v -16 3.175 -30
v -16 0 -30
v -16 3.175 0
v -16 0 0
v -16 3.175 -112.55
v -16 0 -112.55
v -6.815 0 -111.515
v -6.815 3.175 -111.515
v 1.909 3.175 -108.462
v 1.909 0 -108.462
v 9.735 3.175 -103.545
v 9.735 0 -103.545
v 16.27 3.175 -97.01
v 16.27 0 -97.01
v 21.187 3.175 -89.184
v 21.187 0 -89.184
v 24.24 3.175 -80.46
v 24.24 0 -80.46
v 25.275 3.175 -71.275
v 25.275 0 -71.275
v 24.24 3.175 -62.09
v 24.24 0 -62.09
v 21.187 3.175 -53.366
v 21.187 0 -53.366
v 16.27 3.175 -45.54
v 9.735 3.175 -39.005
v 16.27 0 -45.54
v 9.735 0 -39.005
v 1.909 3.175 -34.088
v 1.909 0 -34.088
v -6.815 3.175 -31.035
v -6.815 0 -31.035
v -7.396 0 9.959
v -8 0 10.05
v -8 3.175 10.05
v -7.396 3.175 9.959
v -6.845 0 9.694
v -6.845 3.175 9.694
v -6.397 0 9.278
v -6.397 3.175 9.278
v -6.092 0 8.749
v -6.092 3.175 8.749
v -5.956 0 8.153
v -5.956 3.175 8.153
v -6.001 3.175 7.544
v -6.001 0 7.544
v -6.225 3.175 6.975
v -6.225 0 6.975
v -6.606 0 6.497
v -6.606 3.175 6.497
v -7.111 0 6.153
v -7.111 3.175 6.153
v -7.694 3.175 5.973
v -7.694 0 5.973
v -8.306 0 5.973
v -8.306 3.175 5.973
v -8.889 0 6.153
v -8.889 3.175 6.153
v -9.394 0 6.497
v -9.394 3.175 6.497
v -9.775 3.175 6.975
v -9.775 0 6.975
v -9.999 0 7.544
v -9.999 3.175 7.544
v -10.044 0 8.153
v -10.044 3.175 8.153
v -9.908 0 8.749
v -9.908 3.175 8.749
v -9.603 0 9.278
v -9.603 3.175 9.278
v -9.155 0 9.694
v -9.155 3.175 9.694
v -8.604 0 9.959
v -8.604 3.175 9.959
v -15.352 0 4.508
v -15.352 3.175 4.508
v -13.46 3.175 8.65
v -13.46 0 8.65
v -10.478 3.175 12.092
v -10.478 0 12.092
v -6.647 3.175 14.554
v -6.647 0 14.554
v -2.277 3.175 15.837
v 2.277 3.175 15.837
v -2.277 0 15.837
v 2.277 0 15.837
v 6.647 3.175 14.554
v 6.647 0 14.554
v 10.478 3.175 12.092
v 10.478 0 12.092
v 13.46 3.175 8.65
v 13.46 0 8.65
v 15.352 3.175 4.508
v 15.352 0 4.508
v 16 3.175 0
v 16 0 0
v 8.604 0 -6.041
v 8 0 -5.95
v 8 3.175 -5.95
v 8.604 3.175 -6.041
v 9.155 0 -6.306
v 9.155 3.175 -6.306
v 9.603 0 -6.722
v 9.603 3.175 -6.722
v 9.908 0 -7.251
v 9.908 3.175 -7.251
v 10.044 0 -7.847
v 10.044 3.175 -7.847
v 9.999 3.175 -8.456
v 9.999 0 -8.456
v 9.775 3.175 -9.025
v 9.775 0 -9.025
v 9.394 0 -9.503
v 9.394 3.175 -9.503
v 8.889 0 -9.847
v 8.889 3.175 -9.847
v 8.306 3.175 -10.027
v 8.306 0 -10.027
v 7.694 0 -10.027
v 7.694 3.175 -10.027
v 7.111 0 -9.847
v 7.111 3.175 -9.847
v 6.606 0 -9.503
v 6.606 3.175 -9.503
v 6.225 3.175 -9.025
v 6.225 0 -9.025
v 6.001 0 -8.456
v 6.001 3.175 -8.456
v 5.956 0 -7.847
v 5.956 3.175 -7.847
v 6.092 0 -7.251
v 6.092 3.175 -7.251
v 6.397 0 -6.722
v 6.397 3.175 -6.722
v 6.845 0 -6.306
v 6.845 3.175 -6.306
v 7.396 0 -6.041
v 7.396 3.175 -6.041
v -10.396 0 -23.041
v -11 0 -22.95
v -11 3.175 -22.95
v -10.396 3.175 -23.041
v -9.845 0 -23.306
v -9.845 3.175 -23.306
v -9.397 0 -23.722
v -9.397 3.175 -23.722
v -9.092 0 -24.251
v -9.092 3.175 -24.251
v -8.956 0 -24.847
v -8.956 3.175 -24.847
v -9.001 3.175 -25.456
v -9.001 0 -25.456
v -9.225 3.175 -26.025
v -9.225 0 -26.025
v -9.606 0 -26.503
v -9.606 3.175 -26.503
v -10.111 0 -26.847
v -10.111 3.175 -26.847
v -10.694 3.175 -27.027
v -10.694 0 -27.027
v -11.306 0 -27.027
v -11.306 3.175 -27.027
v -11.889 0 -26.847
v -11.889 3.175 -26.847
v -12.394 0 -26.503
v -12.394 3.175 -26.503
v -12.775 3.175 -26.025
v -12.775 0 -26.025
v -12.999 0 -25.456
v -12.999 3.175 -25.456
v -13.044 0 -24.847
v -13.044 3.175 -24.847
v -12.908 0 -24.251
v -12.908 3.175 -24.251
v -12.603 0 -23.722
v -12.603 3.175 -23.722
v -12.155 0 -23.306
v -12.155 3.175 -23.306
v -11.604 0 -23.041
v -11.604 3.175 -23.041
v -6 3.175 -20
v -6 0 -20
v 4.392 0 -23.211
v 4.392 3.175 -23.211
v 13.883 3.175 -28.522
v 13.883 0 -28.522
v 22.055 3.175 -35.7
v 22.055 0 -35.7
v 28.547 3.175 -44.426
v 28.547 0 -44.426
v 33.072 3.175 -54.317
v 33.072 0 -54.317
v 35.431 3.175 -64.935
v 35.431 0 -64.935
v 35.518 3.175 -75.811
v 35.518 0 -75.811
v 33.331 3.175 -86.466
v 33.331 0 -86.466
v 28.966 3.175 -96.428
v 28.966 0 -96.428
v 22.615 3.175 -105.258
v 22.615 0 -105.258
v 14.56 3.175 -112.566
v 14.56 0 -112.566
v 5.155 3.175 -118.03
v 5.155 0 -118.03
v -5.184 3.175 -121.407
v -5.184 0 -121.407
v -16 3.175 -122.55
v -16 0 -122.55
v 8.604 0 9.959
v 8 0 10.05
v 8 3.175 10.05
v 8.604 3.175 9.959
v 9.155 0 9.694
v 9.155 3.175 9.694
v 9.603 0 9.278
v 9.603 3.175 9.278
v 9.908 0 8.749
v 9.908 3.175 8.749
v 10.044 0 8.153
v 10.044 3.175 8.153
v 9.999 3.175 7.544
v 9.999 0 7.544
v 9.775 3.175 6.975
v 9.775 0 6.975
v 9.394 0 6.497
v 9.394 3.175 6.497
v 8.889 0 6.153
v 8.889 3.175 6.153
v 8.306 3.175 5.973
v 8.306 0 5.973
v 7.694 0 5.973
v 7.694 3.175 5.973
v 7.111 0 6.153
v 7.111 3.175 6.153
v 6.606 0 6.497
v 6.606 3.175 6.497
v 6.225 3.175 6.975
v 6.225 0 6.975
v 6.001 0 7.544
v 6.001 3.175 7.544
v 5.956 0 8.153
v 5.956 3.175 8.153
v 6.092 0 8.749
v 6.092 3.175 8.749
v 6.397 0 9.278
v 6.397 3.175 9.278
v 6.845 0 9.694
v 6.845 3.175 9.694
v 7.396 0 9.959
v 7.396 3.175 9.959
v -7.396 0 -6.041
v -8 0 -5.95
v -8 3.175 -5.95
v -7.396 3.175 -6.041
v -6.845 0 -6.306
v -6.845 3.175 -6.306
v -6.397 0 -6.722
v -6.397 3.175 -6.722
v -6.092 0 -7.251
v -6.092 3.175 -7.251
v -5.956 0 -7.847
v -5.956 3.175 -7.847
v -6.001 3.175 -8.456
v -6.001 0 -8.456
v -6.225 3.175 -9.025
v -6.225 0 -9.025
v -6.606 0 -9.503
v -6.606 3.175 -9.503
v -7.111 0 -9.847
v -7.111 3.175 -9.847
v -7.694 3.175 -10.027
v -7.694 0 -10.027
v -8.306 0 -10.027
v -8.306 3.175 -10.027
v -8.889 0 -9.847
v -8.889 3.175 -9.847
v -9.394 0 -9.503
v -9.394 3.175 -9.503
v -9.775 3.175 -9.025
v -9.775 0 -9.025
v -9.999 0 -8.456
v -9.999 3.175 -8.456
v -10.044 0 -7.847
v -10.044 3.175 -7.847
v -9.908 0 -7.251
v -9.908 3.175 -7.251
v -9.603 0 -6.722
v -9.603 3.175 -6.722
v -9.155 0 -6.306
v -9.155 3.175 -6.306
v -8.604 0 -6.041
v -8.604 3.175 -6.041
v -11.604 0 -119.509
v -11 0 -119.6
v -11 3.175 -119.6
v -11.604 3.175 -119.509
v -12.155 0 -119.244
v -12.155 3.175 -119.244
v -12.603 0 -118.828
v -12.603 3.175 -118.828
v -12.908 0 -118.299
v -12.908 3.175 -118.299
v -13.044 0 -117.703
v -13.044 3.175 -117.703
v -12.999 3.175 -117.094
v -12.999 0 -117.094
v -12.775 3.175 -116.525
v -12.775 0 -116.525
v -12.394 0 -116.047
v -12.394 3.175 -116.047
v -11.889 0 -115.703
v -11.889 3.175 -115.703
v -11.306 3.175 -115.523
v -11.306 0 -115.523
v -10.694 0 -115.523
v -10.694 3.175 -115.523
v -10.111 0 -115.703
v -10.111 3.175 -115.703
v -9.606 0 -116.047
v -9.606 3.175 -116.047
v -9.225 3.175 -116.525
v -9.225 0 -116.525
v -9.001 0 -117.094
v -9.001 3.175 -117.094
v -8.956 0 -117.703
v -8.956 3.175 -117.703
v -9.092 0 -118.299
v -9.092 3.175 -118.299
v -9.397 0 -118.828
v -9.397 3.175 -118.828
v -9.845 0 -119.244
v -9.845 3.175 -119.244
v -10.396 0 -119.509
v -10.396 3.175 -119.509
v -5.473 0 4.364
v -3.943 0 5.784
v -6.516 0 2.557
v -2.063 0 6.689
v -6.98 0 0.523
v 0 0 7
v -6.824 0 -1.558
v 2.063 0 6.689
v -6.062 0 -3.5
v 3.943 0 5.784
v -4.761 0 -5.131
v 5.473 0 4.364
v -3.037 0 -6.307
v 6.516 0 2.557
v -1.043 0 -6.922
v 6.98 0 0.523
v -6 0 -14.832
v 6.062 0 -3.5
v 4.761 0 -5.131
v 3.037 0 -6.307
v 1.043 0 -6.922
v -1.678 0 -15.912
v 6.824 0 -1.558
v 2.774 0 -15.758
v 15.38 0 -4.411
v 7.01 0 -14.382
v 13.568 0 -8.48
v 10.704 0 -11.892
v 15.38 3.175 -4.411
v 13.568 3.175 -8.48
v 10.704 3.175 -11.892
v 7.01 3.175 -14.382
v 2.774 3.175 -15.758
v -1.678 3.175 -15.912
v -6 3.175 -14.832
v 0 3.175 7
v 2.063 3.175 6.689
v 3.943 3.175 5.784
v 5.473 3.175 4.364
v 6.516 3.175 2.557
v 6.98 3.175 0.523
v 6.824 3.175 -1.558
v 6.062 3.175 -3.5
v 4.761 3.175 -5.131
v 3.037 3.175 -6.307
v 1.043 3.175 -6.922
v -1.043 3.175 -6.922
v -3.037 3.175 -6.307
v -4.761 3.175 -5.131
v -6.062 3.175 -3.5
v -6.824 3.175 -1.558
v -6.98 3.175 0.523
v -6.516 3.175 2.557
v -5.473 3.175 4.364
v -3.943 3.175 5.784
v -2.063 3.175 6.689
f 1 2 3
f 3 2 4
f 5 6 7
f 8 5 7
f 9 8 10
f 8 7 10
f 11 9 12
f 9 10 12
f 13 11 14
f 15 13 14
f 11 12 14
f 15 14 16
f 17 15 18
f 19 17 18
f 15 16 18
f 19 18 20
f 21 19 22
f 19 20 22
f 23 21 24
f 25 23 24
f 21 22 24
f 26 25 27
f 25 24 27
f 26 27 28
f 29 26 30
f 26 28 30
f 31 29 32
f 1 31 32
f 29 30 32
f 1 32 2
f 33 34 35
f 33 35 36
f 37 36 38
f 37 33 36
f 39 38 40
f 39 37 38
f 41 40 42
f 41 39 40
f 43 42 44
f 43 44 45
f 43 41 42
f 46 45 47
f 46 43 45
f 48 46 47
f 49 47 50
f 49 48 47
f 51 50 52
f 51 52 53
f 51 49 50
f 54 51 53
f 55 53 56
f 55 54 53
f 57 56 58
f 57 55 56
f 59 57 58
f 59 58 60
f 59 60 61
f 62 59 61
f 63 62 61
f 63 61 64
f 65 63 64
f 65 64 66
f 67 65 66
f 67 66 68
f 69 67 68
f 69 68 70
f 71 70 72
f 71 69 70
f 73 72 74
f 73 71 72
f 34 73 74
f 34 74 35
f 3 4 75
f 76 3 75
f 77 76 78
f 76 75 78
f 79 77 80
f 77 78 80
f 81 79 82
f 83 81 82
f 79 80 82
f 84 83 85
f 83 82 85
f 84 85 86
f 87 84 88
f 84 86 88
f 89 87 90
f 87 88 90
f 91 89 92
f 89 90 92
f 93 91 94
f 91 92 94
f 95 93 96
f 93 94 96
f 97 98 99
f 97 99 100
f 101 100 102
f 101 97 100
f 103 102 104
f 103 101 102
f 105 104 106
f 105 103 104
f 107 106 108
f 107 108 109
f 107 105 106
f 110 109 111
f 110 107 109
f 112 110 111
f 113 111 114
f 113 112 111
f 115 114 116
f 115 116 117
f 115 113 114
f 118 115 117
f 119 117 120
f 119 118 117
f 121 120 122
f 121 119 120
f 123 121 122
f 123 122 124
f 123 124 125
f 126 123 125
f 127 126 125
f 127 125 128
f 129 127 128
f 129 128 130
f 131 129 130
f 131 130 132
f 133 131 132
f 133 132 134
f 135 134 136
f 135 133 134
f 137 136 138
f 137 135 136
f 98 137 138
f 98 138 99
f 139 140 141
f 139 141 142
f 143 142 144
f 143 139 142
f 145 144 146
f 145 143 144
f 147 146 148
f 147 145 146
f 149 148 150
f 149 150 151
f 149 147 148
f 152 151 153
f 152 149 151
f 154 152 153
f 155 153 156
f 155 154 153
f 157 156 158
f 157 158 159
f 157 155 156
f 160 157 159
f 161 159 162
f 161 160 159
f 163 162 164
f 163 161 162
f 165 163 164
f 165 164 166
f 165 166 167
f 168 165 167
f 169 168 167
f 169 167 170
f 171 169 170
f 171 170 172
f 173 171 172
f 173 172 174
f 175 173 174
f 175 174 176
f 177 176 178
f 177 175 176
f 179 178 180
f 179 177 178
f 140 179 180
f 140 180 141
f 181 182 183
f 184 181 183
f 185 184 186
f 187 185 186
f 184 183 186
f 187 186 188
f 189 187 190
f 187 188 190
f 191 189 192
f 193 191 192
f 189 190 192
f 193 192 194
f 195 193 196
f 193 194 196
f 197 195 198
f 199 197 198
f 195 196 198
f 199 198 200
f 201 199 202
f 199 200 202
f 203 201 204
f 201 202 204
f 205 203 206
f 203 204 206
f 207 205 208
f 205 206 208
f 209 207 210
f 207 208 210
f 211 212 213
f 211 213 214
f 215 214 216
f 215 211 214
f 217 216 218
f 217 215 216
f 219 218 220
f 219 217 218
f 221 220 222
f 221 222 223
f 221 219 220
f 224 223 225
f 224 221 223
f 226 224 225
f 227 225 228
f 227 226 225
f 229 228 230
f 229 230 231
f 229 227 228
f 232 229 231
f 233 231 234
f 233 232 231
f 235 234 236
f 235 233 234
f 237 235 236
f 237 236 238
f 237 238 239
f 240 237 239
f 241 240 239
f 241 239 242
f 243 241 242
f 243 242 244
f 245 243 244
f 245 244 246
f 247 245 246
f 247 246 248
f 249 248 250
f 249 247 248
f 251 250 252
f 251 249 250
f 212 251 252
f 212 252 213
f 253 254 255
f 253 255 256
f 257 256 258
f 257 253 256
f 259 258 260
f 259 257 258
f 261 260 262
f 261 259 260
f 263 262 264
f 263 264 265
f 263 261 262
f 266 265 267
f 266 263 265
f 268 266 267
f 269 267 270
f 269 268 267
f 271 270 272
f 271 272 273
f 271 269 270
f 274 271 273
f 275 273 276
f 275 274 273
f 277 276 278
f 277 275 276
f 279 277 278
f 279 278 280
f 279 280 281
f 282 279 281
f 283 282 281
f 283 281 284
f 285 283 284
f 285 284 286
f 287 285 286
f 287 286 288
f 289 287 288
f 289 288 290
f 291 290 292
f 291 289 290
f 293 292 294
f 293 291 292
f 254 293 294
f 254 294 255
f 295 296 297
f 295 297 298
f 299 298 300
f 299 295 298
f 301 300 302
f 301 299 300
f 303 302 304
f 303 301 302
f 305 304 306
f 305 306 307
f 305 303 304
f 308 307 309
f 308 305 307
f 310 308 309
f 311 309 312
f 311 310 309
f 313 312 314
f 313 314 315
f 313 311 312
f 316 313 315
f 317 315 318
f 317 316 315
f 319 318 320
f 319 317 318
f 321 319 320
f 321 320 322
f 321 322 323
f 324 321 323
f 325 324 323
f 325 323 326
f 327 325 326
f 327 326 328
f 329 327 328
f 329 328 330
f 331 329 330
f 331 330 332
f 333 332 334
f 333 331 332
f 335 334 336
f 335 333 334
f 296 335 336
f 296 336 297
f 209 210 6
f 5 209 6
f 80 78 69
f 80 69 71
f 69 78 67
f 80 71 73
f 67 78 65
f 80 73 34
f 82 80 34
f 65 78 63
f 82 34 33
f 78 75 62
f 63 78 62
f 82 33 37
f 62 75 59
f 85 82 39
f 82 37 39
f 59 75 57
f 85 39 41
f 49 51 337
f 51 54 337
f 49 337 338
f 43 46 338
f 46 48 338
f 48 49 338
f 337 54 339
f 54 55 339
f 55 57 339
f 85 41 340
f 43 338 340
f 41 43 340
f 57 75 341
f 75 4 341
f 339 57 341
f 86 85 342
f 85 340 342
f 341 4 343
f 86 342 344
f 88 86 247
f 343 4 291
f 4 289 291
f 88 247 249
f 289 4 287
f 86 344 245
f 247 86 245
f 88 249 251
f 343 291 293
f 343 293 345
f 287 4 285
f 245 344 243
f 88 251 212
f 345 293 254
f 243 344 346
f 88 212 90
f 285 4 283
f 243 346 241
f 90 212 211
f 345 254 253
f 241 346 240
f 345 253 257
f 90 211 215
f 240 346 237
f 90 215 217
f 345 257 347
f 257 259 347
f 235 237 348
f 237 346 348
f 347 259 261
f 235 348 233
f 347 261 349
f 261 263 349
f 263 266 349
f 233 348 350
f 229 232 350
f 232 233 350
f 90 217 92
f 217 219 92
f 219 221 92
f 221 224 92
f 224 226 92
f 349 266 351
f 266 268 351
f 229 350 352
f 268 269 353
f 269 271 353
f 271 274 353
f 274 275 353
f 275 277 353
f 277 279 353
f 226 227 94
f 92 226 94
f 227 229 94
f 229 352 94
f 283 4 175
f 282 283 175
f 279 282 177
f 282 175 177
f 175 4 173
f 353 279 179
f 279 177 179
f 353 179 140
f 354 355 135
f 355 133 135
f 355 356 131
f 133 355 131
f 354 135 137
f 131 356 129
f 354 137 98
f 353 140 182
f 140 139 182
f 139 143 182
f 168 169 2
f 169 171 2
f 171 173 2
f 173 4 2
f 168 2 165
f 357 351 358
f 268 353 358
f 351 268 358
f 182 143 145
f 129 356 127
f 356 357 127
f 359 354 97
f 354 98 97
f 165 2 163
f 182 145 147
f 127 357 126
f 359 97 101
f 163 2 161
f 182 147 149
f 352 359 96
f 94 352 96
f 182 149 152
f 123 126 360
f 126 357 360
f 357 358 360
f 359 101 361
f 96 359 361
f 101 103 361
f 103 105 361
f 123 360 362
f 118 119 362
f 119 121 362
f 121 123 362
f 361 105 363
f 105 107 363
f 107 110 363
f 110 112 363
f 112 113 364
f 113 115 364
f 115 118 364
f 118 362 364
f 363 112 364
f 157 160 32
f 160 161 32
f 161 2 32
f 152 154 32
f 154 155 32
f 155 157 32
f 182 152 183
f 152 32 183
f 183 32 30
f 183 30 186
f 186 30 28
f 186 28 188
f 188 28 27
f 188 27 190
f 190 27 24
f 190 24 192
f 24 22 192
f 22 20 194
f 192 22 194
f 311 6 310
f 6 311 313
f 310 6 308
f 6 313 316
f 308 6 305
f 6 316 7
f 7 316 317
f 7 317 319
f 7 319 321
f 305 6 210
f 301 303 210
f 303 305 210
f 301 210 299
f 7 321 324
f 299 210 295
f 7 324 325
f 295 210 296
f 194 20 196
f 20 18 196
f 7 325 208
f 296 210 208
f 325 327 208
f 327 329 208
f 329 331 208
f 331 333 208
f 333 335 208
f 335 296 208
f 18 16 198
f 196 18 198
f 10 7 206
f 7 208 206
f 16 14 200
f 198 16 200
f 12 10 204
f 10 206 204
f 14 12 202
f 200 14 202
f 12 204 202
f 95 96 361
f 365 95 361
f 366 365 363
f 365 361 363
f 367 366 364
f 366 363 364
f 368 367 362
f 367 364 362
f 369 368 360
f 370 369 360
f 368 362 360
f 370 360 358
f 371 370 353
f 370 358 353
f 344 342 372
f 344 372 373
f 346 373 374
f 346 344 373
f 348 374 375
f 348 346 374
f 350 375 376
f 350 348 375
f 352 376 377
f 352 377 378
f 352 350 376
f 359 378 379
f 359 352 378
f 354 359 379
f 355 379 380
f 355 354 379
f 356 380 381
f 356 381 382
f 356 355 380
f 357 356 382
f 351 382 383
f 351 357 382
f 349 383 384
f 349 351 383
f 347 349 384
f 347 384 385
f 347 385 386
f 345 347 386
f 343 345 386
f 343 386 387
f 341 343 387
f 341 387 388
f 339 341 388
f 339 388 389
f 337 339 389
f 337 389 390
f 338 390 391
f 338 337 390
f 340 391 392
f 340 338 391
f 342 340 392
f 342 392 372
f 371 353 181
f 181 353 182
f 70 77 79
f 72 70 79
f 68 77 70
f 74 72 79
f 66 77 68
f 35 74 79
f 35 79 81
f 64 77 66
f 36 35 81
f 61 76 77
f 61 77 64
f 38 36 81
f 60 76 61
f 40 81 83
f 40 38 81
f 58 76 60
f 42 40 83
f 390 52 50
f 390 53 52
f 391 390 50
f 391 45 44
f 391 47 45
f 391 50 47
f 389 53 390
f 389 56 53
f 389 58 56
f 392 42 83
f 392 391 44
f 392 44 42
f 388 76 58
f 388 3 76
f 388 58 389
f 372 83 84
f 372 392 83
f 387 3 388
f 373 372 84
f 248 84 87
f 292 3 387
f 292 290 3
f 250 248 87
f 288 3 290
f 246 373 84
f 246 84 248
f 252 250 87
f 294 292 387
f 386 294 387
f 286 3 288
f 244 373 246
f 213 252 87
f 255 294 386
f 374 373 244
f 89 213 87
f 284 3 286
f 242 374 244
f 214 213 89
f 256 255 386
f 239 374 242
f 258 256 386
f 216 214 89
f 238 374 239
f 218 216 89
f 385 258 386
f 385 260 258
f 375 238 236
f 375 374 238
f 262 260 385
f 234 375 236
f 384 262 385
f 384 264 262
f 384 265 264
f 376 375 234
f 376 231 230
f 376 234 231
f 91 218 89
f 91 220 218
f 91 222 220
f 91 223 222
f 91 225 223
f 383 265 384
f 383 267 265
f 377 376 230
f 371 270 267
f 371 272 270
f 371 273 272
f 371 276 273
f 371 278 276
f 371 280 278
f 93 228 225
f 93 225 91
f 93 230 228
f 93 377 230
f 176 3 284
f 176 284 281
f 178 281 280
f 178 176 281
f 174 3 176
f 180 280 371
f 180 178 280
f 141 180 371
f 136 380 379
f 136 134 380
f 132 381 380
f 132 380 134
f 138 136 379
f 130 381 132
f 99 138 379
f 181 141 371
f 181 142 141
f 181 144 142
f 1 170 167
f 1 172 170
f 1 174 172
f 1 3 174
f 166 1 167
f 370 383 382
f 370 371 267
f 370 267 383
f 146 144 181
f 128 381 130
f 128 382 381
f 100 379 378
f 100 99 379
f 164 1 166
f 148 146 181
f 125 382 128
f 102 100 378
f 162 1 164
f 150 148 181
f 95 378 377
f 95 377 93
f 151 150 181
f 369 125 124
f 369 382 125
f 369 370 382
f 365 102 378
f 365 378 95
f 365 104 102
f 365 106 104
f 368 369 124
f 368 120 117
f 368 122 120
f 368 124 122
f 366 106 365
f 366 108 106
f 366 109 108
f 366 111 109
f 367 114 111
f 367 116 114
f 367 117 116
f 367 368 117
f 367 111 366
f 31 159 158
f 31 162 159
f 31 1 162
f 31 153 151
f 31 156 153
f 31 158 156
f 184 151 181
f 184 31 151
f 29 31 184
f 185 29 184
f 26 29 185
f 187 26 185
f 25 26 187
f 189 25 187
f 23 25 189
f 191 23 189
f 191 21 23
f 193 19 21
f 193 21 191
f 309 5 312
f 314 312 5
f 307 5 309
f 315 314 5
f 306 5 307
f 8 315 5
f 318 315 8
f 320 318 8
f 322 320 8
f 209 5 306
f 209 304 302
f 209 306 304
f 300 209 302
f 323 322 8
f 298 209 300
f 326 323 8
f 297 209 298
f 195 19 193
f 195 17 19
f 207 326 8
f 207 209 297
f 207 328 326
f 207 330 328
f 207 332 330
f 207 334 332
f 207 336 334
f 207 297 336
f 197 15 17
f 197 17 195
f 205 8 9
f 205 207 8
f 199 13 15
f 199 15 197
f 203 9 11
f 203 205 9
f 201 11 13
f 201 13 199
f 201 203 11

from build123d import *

# Parameters (mm, degrees)
SKETCH1_R           = 2.05
SKETCH1_R_2         = 7
BOSS_EXTRUDE1_DEPTH = 3.175


with BuildPart() as part:
    # Sketch1 → Boss-Extrude1 (new body)
    with BuildSketch(Plane(origin=(0, 0, 0), x_dir=(1, 0, 0), z_dir=(0, 1, 0))):
        with BuildLine():
            Line((-16, 122.55), (-16, 112.55))
            ThreePointArc((-16, 112.55), (25.275, 71.275), (-16, 30))
            Line((-16, 30), (-16, 0))
            ThreePointArc((-16, 0), (0, -16), (16, 0))
            ThreePointArc((16, 0), (8.94427191, 13.266499161), (-6, 14.832396974))
            Line((-6, 14.832396974), (-6, 20))
            ThreePointArc((-6, 20), (35.518206733, 75.811148877), (-16, 122.55))
        make_face()
        with Locations(Location((-8, 8, 0), (0, 0, 270))):
            Circle(SKETCH1_R, mode=Mode.SUBTRACT)
        with Locations(Location((8, 8, 0), (0, 0, 270))):
            Circle(SKETCH1_R, mode=Mode.SUBTRACT)
        with Locations(Location((8, -8, 0), (0, 0, 270))):
            Circle(SKETCH1_R, mode=Mode.SUBTRACT)
        with Locations(Location((-8, -8, 0), (0, 0, 270))):
            Circle(SKETCH1_R, mode=Mode.SUBTRACT)
        with Locations(Location((-11, 25, 0), (0, 0, 270))):
            Circle(SKETCH1_R, mode=Mode.SUBTRACT)
        with Locations(Location((-11, 117.55, 0), (0, 0, 90))):
            Circle(SKETCH1_R, mode=Mode.SUBTRACT)
        with Locations(Location((0, 0, 0), (0, 0, 270))):
            Circle(SKETCH1_R_2, mode=Mode.SUBTRACT)
    extrude(amount=BOSS_EXTRUDE1_DEPTH)


solid = part.part
